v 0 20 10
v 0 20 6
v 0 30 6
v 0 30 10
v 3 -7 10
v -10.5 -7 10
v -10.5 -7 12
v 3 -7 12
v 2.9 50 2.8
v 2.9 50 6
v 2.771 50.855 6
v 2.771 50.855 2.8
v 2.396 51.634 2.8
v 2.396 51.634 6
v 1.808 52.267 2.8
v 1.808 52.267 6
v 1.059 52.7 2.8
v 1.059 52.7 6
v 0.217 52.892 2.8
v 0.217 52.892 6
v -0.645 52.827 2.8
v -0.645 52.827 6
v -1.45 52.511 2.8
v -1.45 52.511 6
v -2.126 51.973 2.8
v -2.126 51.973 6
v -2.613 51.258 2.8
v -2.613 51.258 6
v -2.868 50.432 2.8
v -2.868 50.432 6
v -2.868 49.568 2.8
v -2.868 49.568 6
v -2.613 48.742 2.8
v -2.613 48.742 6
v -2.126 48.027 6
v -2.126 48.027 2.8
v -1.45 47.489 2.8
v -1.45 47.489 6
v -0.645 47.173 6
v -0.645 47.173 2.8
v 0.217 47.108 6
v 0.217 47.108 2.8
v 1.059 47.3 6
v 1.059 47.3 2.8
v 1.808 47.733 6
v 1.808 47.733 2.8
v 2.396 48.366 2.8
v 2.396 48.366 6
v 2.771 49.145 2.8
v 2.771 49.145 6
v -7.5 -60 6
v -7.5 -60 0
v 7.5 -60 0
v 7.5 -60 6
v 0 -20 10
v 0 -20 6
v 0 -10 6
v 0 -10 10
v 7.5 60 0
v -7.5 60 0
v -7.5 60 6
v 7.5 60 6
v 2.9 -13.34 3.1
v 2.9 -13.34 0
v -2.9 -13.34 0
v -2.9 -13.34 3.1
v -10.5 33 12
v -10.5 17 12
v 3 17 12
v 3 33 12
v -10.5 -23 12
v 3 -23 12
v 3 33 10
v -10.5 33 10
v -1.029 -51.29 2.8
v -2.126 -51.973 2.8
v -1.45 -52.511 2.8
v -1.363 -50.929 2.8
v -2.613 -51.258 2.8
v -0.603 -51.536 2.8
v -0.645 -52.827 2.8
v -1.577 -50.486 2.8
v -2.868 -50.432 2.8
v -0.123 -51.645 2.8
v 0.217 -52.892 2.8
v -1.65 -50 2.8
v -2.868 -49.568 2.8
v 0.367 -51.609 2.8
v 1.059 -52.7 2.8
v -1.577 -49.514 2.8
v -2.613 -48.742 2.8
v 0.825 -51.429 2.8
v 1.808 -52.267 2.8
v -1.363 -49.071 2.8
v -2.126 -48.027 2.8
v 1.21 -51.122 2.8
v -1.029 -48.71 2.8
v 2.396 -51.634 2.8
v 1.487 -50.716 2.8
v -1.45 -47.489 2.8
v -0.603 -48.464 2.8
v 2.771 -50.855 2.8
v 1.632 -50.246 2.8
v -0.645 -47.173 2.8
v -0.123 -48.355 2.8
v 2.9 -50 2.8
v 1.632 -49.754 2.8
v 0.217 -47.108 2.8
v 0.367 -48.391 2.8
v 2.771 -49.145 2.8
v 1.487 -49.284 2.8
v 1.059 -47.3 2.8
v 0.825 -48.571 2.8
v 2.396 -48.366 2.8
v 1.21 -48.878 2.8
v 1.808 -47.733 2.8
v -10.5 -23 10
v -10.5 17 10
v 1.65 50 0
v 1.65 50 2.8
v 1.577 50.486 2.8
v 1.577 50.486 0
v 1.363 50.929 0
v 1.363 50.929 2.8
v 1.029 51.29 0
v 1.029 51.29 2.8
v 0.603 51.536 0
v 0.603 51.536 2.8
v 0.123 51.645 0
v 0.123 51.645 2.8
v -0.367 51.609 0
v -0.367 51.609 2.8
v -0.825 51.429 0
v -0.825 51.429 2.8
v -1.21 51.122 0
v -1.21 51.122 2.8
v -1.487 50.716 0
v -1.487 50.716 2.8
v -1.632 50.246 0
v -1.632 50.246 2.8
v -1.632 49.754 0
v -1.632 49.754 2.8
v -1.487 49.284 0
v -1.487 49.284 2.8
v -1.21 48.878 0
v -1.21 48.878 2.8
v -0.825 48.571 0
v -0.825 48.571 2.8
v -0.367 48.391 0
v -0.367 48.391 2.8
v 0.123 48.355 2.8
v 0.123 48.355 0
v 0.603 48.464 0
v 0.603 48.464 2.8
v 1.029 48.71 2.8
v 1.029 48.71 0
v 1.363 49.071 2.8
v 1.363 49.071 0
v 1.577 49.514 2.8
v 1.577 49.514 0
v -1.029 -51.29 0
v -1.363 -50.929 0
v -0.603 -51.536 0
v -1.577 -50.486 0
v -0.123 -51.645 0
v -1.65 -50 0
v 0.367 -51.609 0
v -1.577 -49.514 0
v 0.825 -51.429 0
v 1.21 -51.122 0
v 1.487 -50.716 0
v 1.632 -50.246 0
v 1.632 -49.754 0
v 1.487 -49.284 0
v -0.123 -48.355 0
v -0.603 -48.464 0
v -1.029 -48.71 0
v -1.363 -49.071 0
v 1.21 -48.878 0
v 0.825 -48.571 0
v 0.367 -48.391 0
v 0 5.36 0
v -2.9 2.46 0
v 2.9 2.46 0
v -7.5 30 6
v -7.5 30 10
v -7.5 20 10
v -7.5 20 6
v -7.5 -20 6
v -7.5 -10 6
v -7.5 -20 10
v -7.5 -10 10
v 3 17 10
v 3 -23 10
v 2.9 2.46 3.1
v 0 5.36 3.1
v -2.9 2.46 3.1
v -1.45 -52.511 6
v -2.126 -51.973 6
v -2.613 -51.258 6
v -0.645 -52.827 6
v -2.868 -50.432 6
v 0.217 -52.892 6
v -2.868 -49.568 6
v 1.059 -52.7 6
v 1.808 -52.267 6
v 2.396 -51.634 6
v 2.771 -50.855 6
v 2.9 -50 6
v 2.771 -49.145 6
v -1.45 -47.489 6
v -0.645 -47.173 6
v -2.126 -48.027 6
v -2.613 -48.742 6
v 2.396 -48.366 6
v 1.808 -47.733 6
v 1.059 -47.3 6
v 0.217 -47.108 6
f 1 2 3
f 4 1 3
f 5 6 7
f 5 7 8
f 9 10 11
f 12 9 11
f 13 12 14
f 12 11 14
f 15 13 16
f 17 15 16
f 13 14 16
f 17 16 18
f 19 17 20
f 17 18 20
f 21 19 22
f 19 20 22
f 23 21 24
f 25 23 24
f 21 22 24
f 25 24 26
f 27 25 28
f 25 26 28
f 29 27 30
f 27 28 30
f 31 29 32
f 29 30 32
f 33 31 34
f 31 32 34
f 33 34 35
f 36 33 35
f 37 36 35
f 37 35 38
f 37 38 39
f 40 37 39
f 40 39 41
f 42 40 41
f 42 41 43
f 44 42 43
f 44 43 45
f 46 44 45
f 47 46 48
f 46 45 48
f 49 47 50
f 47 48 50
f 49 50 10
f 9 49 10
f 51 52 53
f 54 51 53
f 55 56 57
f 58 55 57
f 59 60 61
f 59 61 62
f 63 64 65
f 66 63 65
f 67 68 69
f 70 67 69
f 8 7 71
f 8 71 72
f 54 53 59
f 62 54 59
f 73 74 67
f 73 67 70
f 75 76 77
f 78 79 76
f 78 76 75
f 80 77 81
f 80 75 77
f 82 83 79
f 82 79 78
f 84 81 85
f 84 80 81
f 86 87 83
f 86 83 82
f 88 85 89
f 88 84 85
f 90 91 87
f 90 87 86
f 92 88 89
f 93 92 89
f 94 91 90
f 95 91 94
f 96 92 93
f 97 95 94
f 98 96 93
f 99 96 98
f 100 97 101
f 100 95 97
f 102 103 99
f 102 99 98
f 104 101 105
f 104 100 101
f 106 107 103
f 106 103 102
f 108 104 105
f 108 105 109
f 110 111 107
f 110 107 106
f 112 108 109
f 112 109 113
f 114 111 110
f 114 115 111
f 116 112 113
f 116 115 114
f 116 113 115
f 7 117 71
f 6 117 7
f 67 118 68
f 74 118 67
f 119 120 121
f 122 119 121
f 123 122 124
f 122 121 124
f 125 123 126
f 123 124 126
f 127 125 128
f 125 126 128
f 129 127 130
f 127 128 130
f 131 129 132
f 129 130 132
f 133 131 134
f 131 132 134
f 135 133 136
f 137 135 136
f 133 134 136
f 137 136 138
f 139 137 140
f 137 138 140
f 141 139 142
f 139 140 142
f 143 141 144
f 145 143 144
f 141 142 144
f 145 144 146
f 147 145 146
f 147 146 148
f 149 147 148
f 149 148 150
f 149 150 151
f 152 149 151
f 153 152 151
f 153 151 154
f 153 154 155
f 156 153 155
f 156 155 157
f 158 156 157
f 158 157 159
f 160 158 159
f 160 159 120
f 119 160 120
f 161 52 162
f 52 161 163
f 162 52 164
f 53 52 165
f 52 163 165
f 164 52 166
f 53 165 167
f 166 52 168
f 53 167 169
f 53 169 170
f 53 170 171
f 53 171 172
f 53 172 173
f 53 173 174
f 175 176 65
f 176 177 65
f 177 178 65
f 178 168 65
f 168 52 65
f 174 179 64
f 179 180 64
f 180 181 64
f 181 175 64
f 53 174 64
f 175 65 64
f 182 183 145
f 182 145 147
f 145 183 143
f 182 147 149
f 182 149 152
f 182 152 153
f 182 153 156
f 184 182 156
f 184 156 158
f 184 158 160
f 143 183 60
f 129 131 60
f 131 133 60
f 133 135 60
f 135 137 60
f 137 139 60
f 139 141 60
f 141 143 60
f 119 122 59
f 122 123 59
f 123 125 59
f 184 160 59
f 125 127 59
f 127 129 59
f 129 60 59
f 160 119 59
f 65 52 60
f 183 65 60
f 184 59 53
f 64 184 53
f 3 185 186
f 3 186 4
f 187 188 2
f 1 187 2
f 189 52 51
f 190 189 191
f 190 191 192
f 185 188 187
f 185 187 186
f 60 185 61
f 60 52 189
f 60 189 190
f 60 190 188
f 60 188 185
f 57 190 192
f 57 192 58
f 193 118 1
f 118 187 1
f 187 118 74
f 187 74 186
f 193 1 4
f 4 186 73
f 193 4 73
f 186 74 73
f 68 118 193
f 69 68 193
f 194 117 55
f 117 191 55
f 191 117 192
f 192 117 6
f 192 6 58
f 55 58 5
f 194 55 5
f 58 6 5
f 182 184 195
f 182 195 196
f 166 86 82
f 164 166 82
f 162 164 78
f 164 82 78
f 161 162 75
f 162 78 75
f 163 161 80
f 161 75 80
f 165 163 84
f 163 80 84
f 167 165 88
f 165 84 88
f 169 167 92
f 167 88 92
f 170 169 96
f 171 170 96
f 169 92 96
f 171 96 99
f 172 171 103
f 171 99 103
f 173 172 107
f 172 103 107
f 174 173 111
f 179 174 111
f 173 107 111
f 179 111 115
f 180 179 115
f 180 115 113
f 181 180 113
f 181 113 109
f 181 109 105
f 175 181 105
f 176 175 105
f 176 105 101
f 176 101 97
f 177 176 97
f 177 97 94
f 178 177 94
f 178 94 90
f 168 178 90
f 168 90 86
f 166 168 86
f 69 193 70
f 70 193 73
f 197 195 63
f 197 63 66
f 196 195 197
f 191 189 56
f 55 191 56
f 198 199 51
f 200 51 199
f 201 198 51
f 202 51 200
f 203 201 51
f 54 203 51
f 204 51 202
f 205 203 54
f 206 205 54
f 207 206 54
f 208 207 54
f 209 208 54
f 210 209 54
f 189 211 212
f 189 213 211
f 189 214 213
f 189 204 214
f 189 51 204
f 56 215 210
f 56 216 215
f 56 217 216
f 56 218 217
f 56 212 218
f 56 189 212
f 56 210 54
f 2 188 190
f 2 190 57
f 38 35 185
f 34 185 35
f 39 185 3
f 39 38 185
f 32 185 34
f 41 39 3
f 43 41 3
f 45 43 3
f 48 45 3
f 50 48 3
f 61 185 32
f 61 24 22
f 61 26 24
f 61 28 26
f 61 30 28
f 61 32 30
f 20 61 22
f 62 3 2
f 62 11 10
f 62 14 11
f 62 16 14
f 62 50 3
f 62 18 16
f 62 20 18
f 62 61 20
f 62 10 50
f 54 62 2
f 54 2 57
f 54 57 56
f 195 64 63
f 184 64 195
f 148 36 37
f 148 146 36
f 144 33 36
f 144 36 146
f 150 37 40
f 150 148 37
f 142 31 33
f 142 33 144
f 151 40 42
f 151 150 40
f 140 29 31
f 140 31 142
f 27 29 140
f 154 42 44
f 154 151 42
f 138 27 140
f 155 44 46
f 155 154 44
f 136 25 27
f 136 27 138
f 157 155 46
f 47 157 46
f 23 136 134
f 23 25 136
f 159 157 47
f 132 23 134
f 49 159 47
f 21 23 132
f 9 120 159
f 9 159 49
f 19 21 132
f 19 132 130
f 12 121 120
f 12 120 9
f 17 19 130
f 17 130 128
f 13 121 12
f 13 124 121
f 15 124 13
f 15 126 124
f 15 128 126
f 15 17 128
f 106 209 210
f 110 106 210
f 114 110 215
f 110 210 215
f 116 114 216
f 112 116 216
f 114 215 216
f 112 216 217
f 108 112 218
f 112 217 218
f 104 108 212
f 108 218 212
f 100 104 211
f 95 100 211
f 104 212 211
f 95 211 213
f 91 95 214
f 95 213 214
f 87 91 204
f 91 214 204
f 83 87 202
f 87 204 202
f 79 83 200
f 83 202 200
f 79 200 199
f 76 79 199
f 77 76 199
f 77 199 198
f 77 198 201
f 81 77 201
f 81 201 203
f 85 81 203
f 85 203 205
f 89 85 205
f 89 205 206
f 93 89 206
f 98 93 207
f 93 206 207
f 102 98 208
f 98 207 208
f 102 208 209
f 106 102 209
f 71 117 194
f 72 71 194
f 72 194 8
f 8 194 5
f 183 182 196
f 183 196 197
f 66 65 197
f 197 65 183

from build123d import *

# Parameters (mm, degrees)
SKETCH_1_W          = 15
SKETCH_1_H          = 120
EXTRUDE_1_DEPTH     = 6
SKETCH_2_R          = 1.65
CUT_EXTRUDE_1_DEPTH = 61.763887302
SKETCH_3_W          = 5.8
SKETCH_3_H          = 15.8
CUT_EXTRUDE_2_DEPTH = 3.1
CUT_EXTRUDE_3_DEPTH = 3.1
SKETCH_5_R          = 2.9
CUT_EXTRUDE_4_DEPTH = 3.2
SKETCH_6_W          = 7.5
SKETCH_6_H          = 10
EXTRUDE_2_DEPTH     = 4
SKETCH_7_W          = 13.5
SKETCH_7_H          = 16
EXTRUDE_3_DEPTH     = 2


with BuildPart() as part:
    # 草图1 → 凸台-拉伸1 (new body)
    with BuildSketch(Plane.XY):
        Rectangle(SKETCH_1_W, SKETCH_1_H)
    extrude(amount=EXTRUDE_1_DEPTH)

    # 草图2 → 切除-拉伸1 (cut, through all)
    with BuildSketch(Plane.XY.offset(6)):
        with Locations((0, 50)):
            Circle(SKETCH_2_R)
        with Locations(Location((0, -50, 0), (0, 0, 180))):
            Circle(SKETCH_2_R)
    extrude(amount=-CUT_EXTRUDE_1_DEPTH, mode=Mode.SUBTRACT)

    # 草图3 → 切除-拉伸2 (cut)
    with BuildSketch(Plane(origin=(0, 0, 0), x_dir=(-1, 0, 0), z_dir=(0, 0, -1))):
        with Locations((0, -5.44)):
            Rectangle(SKETCH_3_W, SKETCH_3_H)
    extrude(amount=-CUT_EXTRUDE_2_DEPTH, mode=Mode.SUBTRACT)

    # 草图4 → 切除-拉伸3 (cut)
    with BuildSketch(Plane(origin=(0, 0, 0), x_dir=(-1, 0, 0), z_dir=(0, 0, -1))):
        Polygon((-2.9, 2.46), (0, 5.36), (2.9, 2.46), align=None)
    extrude(amount=-CUT_EXTRUDE_3_DEPTH, mode=Mode.SUBTRACT)

    # 草图5 → 切除-拉伸4 (cut)
    with BuildSketch(Plane.XY.offset(6)):
        with Locations((0, 50)):
            Circle(SKETCH_5_R)
        with Locations((0, -50)):
            Circle(SKETCH_5_R)
    extrude(amount=-CUT_EXTRUDE_4_DEPTH, mode=Mode.SUBTRACT)

    # 草图6 → 凸台-拉伸2 (add)
    with BuildSketch(Plane.XY.offset(6)):
        with Locations((-3.75, -15)):
            Rectangle(SKETCH_6_W, SKETCH_6_H)
        with Locations((-3.75, 25)):
            Rectangle(SKETCH_6_W, SKETCH_6_H)
    extrude(amount=EXTRUDE_2_DEPTH)

    # 草图7 → 凸台-拉伸3 (add)
    with BuildSketch(Plane.XY.offset(10)):
        with Locations((-3.75, 25)):
            Rectangle(SKETCH_7_W, SKETCH_7_H)
        with Locations((-3.75, -15)):
            Rectangle(SKETCH_7_W, SKETCH_7_H)
    extrude(amount=EXTRUDE_3_DEPTH)


solid = part.part
